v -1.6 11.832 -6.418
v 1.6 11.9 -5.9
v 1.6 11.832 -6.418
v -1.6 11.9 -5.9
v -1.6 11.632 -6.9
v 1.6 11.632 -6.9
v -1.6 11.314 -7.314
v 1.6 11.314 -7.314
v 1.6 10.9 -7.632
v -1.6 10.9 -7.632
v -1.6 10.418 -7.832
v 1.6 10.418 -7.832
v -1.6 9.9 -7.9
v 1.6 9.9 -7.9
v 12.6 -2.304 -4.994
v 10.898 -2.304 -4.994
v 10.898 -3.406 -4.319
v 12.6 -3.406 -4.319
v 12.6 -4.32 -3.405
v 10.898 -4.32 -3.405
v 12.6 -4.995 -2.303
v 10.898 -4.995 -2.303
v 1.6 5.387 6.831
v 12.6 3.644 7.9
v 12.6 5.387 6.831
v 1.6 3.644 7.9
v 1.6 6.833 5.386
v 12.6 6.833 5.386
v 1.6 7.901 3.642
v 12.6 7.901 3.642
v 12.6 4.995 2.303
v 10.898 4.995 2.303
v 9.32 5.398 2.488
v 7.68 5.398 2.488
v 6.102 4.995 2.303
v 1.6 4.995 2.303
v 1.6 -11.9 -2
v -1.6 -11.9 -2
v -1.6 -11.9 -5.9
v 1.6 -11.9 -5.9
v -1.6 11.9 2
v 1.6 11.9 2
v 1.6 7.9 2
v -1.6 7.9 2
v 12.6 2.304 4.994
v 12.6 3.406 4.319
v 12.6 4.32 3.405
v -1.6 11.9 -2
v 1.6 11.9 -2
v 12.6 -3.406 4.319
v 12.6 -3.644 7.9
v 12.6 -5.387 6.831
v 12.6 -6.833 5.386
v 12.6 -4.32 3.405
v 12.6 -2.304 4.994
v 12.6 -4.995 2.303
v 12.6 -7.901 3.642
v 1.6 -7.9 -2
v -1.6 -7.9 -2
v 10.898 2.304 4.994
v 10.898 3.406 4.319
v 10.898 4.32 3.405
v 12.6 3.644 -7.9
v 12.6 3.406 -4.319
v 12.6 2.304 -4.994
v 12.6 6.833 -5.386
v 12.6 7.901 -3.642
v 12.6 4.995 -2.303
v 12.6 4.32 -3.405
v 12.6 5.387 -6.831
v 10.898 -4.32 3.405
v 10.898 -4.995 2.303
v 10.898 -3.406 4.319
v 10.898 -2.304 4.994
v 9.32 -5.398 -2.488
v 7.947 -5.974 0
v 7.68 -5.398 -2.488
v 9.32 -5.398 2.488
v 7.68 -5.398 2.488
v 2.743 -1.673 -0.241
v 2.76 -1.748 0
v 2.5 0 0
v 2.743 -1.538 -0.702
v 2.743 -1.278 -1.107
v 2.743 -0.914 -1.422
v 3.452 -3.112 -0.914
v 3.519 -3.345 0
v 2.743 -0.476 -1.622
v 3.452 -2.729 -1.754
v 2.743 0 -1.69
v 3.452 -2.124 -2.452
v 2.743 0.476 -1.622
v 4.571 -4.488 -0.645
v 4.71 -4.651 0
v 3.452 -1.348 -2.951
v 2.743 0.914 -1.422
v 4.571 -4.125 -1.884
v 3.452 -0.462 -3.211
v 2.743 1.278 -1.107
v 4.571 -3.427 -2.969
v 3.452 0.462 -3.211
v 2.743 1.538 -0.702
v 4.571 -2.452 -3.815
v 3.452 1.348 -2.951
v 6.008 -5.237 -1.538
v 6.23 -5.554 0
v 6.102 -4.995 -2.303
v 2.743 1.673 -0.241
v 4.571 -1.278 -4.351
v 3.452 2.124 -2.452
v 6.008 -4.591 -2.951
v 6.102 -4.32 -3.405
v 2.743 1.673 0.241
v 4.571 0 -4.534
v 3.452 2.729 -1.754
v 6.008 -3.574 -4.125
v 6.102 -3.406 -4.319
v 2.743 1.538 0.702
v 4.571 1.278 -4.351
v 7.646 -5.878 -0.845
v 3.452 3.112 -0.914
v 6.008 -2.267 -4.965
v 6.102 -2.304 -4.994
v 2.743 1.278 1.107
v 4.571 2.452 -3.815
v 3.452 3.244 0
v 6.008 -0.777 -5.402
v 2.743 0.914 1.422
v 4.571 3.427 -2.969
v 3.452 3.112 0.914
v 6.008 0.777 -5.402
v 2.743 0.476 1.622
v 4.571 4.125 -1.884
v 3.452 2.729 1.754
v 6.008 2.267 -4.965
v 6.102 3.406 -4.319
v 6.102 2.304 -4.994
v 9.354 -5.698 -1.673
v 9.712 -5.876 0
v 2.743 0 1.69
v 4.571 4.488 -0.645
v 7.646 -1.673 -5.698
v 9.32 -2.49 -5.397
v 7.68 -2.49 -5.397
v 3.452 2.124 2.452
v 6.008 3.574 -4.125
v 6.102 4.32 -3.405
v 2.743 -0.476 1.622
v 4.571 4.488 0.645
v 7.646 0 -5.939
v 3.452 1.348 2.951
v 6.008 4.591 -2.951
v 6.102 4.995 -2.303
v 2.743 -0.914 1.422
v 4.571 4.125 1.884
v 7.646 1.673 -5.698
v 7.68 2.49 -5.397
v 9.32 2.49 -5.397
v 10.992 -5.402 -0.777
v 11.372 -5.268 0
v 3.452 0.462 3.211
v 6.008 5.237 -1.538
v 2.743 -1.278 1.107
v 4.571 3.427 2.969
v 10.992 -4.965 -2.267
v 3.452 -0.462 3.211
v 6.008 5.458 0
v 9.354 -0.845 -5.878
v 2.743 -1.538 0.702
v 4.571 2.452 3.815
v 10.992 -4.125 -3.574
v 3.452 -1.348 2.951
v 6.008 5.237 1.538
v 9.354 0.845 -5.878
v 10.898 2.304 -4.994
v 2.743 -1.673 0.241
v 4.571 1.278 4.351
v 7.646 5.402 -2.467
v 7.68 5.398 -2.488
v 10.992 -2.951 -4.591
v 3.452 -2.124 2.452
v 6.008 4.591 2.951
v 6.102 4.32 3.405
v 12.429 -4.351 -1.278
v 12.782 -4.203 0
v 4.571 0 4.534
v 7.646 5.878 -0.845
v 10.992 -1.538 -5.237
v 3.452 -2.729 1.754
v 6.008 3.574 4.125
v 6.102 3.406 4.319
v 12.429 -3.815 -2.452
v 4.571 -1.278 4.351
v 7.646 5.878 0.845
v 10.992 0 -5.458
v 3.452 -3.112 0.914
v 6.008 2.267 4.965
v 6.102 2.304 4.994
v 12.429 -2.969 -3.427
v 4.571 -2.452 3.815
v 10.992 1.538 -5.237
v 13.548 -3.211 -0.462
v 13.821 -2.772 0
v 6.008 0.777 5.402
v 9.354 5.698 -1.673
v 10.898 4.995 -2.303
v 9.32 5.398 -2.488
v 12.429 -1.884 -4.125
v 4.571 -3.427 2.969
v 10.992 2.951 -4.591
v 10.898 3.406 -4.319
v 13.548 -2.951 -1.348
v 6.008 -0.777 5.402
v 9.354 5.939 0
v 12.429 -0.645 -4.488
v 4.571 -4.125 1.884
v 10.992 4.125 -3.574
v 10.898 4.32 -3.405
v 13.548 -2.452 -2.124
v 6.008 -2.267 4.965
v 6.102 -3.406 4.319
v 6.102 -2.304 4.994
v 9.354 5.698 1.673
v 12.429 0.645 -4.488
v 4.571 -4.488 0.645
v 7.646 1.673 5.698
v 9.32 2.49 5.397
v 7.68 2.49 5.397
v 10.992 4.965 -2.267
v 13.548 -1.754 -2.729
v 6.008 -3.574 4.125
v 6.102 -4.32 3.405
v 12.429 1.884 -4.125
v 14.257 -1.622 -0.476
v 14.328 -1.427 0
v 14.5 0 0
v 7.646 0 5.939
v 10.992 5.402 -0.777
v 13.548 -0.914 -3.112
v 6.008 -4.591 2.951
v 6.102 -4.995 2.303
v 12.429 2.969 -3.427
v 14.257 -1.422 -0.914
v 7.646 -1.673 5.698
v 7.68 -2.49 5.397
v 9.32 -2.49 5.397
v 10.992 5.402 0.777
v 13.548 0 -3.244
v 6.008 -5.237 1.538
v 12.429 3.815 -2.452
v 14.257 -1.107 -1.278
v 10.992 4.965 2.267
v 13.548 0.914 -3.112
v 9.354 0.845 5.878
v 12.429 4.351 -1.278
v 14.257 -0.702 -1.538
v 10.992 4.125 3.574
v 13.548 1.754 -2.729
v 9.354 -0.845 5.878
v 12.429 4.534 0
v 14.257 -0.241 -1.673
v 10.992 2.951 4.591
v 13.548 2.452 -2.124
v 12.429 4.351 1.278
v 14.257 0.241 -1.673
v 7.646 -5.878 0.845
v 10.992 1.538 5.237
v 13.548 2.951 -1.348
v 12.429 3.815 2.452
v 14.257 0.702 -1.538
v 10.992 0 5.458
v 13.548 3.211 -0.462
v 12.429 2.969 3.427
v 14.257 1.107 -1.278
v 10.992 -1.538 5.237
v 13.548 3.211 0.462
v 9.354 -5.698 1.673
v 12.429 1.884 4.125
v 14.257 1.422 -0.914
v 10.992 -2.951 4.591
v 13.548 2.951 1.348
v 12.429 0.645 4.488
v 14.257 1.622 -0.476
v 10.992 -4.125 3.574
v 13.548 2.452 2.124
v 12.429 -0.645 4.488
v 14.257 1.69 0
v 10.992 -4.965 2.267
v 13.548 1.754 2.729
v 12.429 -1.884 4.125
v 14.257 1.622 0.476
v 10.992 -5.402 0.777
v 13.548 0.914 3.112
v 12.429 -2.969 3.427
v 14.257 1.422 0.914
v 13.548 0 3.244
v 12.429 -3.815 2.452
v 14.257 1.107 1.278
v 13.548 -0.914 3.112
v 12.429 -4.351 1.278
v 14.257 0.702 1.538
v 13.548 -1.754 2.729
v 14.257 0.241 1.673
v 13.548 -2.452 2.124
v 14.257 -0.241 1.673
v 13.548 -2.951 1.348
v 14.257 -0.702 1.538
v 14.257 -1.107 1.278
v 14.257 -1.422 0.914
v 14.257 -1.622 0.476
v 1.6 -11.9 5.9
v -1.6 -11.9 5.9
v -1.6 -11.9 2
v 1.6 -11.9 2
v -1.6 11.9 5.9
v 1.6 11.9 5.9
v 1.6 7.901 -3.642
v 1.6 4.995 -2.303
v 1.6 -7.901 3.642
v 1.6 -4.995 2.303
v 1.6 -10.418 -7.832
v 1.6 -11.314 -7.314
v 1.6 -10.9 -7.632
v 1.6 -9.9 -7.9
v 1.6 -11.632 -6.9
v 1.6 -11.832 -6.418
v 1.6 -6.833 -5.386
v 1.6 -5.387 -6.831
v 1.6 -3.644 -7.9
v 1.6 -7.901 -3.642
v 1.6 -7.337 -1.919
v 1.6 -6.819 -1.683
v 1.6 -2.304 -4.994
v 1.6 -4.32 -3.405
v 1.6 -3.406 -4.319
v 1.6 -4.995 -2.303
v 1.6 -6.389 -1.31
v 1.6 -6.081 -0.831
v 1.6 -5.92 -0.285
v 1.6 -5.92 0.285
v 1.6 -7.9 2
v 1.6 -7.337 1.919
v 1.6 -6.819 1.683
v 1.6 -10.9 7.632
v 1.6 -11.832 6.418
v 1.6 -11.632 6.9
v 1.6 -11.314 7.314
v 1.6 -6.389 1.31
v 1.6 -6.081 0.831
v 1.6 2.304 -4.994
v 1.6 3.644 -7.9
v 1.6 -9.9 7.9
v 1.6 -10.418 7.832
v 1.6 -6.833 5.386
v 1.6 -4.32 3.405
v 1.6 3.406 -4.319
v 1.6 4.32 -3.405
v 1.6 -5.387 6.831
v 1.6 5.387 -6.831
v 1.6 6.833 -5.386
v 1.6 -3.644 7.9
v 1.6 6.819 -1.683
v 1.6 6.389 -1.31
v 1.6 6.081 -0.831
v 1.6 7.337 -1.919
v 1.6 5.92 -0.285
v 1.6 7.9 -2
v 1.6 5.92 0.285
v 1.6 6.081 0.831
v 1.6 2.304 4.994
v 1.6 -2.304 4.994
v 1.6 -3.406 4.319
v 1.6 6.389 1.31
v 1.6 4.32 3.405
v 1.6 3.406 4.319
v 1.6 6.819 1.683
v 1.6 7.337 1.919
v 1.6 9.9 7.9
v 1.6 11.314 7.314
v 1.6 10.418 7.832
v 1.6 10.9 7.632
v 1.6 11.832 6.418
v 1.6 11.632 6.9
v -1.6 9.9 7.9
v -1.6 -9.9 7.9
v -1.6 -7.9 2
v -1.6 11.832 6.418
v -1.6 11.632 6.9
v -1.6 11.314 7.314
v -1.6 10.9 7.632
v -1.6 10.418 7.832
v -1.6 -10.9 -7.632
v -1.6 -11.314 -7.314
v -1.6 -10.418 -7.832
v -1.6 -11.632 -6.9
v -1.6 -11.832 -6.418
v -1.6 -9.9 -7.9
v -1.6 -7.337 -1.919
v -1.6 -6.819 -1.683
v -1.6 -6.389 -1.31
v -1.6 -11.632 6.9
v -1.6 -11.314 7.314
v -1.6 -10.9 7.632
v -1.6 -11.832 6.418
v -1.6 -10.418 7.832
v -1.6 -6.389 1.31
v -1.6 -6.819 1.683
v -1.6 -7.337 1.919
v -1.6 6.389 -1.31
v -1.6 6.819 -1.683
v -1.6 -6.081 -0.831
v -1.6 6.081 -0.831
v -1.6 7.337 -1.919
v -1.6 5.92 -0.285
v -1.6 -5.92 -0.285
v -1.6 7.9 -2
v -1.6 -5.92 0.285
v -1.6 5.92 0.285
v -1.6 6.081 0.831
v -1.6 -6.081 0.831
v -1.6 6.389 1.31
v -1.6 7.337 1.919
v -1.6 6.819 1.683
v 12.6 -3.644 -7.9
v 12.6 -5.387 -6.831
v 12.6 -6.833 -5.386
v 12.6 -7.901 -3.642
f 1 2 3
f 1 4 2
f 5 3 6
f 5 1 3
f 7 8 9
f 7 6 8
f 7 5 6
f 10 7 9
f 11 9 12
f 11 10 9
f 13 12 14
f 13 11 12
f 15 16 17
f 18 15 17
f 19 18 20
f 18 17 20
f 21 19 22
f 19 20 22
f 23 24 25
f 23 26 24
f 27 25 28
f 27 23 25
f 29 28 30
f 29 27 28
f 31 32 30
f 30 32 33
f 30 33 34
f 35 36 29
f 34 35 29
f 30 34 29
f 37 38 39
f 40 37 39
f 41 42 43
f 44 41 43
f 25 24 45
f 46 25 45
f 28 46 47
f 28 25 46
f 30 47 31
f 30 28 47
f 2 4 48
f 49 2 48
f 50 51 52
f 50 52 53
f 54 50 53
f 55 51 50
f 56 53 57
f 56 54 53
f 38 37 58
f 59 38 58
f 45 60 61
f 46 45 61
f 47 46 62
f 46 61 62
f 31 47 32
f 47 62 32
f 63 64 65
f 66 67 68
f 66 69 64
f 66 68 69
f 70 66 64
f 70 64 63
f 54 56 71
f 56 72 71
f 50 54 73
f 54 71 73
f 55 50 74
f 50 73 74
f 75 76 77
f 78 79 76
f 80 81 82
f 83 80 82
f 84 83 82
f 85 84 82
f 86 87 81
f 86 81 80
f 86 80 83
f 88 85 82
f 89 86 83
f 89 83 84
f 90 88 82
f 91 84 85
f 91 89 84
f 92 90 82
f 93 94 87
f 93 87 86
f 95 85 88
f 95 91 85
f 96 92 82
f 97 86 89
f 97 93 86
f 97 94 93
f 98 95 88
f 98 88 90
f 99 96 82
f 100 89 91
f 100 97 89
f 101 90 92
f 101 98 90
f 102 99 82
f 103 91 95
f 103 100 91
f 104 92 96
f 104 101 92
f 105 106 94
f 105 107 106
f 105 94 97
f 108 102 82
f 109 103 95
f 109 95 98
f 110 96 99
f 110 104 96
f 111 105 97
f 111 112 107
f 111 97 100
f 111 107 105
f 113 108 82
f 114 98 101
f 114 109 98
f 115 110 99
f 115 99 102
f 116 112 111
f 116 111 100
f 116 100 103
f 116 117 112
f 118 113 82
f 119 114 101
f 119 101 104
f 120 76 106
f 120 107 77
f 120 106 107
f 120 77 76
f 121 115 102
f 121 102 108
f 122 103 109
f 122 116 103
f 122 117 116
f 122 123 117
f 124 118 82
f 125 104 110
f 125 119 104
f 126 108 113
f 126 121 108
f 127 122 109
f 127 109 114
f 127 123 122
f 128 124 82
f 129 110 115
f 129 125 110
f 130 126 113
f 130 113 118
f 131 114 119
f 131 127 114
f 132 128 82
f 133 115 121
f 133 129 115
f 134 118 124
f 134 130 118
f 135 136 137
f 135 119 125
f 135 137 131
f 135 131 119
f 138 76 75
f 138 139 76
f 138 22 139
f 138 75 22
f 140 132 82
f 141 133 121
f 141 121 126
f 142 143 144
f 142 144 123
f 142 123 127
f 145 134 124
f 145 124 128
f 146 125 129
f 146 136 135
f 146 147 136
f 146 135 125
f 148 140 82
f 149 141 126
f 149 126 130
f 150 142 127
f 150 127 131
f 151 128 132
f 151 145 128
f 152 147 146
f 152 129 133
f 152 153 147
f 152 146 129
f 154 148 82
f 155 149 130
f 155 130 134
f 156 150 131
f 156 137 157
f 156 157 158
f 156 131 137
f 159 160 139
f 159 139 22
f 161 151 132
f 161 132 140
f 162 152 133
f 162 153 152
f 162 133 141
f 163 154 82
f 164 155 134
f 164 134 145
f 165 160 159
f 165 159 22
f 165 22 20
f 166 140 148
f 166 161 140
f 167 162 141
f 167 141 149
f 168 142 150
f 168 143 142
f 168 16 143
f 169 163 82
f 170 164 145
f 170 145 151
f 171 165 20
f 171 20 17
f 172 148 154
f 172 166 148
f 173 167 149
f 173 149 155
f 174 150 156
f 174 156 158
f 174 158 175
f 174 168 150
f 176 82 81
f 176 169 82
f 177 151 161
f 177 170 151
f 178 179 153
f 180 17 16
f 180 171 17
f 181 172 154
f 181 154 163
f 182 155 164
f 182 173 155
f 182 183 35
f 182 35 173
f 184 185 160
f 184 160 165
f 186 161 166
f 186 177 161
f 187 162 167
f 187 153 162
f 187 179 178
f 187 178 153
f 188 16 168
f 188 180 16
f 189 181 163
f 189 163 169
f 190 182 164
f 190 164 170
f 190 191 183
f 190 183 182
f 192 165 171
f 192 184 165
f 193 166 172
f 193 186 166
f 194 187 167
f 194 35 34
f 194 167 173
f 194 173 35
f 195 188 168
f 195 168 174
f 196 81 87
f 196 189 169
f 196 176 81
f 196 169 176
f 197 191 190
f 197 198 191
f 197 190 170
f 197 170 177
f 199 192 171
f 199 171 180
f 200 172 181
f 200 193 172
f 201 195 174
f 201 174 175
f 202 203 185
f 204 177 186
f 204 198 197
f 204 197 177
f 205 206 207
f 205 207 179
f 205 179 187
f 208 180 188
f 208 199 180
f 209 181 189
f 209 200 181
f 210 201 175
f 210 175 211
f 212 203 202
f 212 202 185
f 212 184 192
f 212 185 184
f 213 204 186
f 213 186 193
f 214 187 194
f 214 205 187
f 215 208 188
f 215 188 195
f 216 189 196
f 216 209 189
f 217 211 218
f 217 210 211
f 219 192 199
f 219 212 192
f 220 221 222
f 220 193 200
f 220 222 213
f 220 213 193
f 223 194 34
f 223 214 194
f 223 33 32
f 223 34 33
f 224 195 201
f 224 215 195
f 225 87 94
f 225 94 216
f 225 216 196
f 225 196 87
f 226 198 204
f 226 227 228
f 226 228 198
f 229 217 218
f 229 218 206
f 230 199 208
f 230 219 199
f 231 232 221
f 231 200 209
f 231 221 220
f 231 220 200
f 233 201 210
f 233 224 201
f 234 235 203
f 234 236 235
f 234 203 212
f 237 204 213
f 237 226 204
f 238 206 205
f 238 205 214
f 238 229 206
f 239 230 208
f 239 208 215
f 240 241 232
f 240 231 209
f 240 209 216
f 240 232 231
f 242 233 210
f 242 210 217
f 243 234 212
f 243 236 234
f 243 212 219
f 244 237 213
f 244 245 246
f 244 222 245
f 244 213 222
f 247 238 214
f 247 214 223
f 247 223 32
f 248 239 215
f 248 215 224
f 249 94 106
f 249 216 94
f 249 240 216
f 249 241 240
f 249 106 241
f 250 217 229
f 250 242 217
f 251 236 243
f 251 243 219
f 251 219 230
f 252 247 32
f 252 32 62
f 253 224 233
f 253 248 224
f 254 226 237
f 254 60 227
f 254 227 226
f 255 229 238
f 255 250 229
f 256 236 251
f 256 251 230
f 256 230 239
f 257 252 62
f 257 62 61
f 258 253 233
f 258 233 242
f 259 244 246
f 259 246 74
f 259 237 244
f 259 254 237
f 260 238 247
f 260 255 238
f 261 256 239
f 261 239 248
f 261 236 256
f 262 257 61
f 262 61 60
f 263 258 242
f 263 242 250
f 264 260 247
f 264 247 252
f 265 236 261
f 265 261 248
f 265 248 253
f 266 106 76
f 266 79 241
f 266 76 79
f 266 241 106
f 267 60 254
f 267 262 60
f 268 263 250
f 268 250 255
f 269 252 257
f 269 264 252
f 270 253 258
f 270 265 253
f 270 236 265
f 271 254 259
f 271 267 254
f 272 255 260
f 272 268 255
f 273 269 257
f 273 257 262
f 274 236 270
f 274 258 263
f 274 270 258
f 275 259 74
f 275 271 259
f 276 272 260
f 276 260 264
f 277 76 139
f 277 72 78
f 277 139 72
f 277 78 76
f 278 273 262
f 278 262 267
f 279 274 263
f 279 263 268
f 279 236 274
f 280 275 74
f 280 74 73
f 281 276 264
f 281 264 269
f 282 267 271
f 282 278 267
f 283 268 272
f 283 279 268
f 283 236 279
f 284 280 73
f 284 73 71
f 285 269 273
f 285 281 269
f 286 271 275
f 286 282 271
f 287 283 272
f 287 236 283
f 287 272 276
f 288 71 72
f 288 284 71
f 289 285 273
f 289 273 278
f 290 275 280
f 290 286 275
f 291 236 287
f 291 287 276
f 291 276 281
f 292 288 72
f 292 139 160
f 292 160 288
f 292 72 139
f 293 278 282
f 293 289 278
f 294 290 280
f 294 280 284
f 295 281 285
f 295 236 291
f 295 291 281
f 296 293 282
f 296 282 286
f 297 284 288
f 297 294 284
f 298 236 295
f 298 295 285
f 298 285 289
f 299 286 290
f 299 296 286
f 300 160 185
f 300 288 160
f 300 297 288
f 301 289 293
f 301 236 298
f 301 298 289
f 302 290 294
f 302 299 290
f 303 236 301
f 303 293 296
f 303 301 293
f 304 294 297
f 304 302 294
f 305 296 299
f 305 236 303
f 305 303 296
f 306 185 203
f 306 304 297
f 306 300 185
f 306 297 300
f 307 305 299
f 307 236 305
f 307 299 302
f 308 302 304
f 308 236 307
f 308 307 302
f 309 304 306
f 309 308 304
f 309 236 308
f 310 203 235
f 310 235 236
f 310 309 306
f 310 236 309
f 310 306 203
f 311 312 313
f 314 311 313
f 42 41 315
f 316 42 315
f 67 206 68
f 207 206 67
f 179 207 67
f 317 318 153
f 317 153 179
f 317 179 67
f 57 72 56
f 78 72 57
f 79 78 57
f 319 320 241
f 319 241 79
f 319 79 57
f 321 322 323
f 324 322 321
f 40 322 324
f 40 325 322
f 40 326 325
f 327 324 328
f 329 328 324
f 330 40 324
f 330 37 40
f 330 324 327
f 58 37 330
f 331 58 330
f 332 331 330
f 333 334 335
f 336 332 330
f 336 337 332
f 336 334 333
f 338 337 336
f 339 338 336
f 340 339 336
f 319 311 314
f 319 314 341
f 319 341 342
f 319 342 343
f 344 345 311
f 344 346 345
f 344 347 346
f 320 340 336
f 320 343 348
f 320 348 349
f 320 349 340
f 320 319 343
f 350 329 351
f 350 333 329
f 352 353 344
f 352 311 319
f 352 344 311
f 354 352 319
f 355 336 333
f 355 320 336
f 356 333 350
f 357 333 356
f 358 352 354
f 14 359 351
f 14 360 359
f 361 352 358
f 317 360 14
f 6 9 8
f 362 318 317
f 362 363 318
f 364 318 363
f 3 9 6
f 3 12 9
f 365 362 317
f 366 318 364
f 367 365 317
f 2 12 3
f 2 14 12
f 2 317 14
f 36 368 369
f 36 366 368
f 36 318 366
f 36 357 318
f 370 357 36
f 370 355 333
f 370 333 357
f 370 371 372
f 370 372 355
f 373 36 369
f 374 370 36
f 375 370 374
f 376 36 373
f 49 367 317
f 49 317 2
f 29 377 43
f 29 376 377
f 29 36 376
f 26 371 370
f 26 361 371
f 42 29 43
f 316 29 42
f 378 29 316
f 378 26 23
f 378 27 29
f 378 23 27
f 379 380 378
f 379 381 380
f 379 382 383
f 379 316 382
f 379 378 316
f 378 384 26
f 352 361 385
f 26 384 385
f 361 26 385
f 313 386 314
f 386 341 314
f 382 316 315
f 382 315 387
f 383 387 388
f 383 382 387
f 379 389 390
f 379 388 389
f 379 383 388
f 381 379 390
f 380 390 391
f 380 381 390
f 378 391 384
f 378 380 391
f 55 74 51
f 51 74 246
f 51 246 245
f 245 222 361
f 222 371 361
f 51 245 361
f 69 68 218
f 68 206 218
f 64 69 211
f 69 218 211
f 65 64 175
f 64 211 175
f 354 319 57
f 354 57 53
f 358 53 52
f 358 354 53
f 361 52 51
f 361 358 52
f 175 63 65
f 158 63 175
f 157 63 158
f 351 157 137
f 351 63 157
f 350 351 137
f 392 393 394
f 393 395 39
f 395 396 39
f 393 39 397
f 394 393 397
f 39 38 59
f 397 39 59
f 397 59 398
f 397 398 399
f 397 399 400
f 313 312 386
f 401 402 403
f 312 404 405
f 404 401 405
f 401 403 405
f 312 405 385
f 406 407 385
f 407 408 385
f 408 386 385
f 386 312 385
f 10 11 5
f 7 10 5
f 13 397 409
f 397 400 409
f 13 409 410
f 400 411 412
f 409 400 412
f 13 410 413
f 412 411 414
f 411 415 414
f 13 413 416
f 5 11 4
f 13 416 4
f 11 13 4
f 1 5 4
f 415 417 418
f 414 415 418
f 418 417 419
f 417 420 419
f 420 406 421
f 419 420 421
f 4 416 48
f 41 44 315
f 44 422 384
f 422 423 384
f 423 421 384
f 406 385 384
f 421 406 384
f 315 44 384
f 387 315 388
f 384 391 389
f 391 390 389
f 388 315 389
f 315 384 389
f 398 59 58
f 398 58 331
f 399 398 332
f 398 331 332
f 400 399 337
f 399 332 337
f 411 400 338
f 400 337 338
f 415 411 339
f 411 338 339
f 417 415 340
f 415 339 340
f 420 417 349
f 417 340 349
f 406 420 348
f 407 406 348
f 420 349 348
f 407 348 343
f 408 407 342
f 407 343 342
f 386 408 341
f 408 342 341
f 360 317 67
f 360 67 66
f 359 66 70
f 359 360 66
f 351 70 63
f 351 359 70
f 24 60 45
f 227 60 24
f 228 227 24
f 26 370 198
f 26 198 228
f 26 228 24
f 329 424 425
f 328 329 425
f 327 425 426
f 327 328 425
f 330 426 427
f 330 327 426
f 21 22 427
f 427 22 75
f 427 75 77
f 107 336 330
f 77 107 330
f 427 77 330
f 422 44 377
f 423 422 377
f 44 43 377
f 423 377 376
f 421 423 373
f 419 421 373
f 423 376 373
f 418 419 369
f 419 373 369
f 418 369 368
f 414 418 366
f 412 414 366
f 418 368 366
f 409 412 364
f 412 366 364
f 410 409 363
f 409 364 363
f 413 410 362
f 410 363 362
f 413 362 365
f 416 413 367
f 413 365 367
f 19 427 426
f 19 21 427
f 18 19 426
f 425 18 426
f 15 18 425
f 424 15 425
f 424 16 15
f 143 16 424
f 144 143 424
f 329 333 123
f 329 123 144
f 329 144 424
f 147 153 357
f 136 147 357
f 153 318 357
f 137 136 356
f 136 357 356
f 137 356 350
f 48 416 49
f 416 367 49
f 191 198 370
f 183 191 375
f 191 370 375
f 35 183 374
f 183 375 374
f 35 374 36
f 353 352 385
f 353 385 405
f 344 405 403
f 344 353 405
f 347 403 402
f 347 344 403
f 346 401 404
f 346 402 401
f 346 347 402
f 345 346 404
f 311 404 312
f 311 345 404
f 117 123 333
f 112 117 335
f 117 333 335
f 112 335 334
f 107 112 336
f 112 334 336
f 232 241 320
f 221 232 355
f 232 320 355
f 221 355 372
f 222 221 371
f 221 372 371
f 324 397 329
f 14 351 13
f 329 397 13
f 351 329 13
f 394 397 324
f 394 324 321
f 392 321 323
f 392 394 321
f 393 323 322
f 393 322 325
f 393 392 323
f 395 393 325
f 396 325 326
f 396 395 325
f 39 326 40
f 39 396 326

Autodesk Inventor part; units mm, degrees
ref_plane "YZ Plane" through (0, 0, 0) normal (1, 0, 0) x (0, 1, 0)
ref_plane "XZ Plane" through (0, 0, 0) normal (0, 1, 0) x (-1, 0, 0)
sketch "Esquisse1" plane through (0, 0, 0) normal (1, 0, 0) x (0, 1, 0)
  line L0 (11.9, 7.9) -> (-11.9, 7.9)
  line L1 (-11.9, 7.9) -> (-11.9, -7.9)
  line L2 (-11.9, -7.9) -> (11.9, -7.9)
  line L3 (11.9, -7.9) -> (11.9, 7.9)
  point P0 (0, 0)
  point P1 (11.9, 0)
  point P2 (0, -7.9)
  dimension "d0" = 23.8
  dimension "d3" = 15.8
extrude "Extrusion1" add sketch "Esquisse1" along normal mid plane 3.2
sketch "Esquisse2" plane through (1.6, 0, 0) normal (1, 0, 0) x (0, 0, -1)
  circle A0 centre (0, 0) radius 8.7
  line L0 (7.9, -11.9) -> (7.9, 11.9) projected
  line L1 (7.9, 3.6442) -> (0, 0)
  line L2 (0, 0) -> (7.9, -3.6442)
  line L3 (0, 0) -> (-7.9, -3.6442)
  line L4 (-7.9, 11.9) -> (-7.9, -11.9) projected
  line L5 (0, 0) -> (-7.9, 3.6442)
  line L6 (0, 0) -> (3.6423, -7.9008)
  line L7 (0, 0) -> (-3.6423, -7.9008)
  line L8 (0, 0) -> (3.6423, 7.9008)
  line L9 (0, 0) -> (-3.6423, 7.9008)
  line L10 (3.6423, 7.9008) -> (-3.6423, 7.9008) construction
  line L11 (3.6423, -7.9008) -> (-3.6423, -7.9008) construction
  line L12 (0, -7.9008) -> (0, 7.9008) construction
  circle A1 centre (0, 0) radius 5.5
  point P0 (2.3026, 4.9948)
  point P1 (4.9943, 2.3038)
  point P2 (-4.9943, 2.3038)
  point P3 (-2.3026, 4.9948)
  point P4 (-2.3026, -4.9948)
  point P5 (-4.9943, -2.3038)
  point P6 (4.9943, -2.3038)
  point P7 (2.3026, -4.9948)
  dimension "d4" = 17.4
  dimension "d7" = 49.5
  dimension "d8" = 49.5
  dimension "d9" = 11
extrude "Extrusion3" add sketch "Esquisse2" along normal blind 11 contours L1 A1 L8 A0 | A0 L6 A1 L2 | L9 A1 L5 A0 | A0 L3 A1 L7
sketch "Esquisse3" plane through (1.6, 0, 0) normal (1, 0, 0) x (0, 0, -1)
  line L0 (0, -7.9) -> (0, -17.3183) construction
  line L1 (-2, -7.9) -> (-2, -17.3183)
  line L2 (2, -17.3183) -> (2, -7.9)
  arc A0 (2, -7.9) -> (-2, -7.9) centre (0, -7.9) ccw
  arc A1 (-2, -17.3183) -> (2, -17.3183) centre (0, -17.3183) ccw
  line L3 (-7.9, -11.9) -> (7.9, -11.9) projected
  line L4 (0, -25.5619) -> (0, 18.1437) projected
  point P0 (0, 0)
  point P1 (0, -12.6091)
  point P2 (2, -11.9)
  point P3 (-2, -11.9)
  dimension "d12" = 4
  dimension "d13" = 4
extrude "Extrusion4" cut sketch "Esquisse3" against normal blind 11 contours A0 L4 L3 L1 | A0 L2 L3 L4
mirror "Symétrie1" about plane through (0, 0, 0) normal (0, 1, 0) of "Extrusion4"
sketch "Esquisse4" plane through (0, 0, 0) normal (0, 0, 1) x (1, 0, 0)
  circle A0 centre (8.5, 0) radius 6
  line L0 (14.5, 0) -> (-1.6, 0)
  line L1 (-1.6, -11.9) -> (-1.6, 11.9) projected
  point P0 (0, 0)
  point P1 (2.5, 0)
  dimension "d16" = 12
  dimension "d17" = 16.1
revolve "Révolution1" add sketch "Esquisse4" angle 360 about axis through (14.5, 0, 0) along (-1, 0, 0) picked at (6.7291, -0.9294) contours A0 L0
fillet "Congé1" radius 2 4 edges at (0, 11.9, 7.9) (0, 11.9, -7.9) (0, -11.9, -7.9) (0, -11.9, 7.9)
ref_plane "Plan de construction1" through (14.5, 0, 0) normal (1, 0, 0) x (0, 1, 0)
properties part number "Roue_libre"
